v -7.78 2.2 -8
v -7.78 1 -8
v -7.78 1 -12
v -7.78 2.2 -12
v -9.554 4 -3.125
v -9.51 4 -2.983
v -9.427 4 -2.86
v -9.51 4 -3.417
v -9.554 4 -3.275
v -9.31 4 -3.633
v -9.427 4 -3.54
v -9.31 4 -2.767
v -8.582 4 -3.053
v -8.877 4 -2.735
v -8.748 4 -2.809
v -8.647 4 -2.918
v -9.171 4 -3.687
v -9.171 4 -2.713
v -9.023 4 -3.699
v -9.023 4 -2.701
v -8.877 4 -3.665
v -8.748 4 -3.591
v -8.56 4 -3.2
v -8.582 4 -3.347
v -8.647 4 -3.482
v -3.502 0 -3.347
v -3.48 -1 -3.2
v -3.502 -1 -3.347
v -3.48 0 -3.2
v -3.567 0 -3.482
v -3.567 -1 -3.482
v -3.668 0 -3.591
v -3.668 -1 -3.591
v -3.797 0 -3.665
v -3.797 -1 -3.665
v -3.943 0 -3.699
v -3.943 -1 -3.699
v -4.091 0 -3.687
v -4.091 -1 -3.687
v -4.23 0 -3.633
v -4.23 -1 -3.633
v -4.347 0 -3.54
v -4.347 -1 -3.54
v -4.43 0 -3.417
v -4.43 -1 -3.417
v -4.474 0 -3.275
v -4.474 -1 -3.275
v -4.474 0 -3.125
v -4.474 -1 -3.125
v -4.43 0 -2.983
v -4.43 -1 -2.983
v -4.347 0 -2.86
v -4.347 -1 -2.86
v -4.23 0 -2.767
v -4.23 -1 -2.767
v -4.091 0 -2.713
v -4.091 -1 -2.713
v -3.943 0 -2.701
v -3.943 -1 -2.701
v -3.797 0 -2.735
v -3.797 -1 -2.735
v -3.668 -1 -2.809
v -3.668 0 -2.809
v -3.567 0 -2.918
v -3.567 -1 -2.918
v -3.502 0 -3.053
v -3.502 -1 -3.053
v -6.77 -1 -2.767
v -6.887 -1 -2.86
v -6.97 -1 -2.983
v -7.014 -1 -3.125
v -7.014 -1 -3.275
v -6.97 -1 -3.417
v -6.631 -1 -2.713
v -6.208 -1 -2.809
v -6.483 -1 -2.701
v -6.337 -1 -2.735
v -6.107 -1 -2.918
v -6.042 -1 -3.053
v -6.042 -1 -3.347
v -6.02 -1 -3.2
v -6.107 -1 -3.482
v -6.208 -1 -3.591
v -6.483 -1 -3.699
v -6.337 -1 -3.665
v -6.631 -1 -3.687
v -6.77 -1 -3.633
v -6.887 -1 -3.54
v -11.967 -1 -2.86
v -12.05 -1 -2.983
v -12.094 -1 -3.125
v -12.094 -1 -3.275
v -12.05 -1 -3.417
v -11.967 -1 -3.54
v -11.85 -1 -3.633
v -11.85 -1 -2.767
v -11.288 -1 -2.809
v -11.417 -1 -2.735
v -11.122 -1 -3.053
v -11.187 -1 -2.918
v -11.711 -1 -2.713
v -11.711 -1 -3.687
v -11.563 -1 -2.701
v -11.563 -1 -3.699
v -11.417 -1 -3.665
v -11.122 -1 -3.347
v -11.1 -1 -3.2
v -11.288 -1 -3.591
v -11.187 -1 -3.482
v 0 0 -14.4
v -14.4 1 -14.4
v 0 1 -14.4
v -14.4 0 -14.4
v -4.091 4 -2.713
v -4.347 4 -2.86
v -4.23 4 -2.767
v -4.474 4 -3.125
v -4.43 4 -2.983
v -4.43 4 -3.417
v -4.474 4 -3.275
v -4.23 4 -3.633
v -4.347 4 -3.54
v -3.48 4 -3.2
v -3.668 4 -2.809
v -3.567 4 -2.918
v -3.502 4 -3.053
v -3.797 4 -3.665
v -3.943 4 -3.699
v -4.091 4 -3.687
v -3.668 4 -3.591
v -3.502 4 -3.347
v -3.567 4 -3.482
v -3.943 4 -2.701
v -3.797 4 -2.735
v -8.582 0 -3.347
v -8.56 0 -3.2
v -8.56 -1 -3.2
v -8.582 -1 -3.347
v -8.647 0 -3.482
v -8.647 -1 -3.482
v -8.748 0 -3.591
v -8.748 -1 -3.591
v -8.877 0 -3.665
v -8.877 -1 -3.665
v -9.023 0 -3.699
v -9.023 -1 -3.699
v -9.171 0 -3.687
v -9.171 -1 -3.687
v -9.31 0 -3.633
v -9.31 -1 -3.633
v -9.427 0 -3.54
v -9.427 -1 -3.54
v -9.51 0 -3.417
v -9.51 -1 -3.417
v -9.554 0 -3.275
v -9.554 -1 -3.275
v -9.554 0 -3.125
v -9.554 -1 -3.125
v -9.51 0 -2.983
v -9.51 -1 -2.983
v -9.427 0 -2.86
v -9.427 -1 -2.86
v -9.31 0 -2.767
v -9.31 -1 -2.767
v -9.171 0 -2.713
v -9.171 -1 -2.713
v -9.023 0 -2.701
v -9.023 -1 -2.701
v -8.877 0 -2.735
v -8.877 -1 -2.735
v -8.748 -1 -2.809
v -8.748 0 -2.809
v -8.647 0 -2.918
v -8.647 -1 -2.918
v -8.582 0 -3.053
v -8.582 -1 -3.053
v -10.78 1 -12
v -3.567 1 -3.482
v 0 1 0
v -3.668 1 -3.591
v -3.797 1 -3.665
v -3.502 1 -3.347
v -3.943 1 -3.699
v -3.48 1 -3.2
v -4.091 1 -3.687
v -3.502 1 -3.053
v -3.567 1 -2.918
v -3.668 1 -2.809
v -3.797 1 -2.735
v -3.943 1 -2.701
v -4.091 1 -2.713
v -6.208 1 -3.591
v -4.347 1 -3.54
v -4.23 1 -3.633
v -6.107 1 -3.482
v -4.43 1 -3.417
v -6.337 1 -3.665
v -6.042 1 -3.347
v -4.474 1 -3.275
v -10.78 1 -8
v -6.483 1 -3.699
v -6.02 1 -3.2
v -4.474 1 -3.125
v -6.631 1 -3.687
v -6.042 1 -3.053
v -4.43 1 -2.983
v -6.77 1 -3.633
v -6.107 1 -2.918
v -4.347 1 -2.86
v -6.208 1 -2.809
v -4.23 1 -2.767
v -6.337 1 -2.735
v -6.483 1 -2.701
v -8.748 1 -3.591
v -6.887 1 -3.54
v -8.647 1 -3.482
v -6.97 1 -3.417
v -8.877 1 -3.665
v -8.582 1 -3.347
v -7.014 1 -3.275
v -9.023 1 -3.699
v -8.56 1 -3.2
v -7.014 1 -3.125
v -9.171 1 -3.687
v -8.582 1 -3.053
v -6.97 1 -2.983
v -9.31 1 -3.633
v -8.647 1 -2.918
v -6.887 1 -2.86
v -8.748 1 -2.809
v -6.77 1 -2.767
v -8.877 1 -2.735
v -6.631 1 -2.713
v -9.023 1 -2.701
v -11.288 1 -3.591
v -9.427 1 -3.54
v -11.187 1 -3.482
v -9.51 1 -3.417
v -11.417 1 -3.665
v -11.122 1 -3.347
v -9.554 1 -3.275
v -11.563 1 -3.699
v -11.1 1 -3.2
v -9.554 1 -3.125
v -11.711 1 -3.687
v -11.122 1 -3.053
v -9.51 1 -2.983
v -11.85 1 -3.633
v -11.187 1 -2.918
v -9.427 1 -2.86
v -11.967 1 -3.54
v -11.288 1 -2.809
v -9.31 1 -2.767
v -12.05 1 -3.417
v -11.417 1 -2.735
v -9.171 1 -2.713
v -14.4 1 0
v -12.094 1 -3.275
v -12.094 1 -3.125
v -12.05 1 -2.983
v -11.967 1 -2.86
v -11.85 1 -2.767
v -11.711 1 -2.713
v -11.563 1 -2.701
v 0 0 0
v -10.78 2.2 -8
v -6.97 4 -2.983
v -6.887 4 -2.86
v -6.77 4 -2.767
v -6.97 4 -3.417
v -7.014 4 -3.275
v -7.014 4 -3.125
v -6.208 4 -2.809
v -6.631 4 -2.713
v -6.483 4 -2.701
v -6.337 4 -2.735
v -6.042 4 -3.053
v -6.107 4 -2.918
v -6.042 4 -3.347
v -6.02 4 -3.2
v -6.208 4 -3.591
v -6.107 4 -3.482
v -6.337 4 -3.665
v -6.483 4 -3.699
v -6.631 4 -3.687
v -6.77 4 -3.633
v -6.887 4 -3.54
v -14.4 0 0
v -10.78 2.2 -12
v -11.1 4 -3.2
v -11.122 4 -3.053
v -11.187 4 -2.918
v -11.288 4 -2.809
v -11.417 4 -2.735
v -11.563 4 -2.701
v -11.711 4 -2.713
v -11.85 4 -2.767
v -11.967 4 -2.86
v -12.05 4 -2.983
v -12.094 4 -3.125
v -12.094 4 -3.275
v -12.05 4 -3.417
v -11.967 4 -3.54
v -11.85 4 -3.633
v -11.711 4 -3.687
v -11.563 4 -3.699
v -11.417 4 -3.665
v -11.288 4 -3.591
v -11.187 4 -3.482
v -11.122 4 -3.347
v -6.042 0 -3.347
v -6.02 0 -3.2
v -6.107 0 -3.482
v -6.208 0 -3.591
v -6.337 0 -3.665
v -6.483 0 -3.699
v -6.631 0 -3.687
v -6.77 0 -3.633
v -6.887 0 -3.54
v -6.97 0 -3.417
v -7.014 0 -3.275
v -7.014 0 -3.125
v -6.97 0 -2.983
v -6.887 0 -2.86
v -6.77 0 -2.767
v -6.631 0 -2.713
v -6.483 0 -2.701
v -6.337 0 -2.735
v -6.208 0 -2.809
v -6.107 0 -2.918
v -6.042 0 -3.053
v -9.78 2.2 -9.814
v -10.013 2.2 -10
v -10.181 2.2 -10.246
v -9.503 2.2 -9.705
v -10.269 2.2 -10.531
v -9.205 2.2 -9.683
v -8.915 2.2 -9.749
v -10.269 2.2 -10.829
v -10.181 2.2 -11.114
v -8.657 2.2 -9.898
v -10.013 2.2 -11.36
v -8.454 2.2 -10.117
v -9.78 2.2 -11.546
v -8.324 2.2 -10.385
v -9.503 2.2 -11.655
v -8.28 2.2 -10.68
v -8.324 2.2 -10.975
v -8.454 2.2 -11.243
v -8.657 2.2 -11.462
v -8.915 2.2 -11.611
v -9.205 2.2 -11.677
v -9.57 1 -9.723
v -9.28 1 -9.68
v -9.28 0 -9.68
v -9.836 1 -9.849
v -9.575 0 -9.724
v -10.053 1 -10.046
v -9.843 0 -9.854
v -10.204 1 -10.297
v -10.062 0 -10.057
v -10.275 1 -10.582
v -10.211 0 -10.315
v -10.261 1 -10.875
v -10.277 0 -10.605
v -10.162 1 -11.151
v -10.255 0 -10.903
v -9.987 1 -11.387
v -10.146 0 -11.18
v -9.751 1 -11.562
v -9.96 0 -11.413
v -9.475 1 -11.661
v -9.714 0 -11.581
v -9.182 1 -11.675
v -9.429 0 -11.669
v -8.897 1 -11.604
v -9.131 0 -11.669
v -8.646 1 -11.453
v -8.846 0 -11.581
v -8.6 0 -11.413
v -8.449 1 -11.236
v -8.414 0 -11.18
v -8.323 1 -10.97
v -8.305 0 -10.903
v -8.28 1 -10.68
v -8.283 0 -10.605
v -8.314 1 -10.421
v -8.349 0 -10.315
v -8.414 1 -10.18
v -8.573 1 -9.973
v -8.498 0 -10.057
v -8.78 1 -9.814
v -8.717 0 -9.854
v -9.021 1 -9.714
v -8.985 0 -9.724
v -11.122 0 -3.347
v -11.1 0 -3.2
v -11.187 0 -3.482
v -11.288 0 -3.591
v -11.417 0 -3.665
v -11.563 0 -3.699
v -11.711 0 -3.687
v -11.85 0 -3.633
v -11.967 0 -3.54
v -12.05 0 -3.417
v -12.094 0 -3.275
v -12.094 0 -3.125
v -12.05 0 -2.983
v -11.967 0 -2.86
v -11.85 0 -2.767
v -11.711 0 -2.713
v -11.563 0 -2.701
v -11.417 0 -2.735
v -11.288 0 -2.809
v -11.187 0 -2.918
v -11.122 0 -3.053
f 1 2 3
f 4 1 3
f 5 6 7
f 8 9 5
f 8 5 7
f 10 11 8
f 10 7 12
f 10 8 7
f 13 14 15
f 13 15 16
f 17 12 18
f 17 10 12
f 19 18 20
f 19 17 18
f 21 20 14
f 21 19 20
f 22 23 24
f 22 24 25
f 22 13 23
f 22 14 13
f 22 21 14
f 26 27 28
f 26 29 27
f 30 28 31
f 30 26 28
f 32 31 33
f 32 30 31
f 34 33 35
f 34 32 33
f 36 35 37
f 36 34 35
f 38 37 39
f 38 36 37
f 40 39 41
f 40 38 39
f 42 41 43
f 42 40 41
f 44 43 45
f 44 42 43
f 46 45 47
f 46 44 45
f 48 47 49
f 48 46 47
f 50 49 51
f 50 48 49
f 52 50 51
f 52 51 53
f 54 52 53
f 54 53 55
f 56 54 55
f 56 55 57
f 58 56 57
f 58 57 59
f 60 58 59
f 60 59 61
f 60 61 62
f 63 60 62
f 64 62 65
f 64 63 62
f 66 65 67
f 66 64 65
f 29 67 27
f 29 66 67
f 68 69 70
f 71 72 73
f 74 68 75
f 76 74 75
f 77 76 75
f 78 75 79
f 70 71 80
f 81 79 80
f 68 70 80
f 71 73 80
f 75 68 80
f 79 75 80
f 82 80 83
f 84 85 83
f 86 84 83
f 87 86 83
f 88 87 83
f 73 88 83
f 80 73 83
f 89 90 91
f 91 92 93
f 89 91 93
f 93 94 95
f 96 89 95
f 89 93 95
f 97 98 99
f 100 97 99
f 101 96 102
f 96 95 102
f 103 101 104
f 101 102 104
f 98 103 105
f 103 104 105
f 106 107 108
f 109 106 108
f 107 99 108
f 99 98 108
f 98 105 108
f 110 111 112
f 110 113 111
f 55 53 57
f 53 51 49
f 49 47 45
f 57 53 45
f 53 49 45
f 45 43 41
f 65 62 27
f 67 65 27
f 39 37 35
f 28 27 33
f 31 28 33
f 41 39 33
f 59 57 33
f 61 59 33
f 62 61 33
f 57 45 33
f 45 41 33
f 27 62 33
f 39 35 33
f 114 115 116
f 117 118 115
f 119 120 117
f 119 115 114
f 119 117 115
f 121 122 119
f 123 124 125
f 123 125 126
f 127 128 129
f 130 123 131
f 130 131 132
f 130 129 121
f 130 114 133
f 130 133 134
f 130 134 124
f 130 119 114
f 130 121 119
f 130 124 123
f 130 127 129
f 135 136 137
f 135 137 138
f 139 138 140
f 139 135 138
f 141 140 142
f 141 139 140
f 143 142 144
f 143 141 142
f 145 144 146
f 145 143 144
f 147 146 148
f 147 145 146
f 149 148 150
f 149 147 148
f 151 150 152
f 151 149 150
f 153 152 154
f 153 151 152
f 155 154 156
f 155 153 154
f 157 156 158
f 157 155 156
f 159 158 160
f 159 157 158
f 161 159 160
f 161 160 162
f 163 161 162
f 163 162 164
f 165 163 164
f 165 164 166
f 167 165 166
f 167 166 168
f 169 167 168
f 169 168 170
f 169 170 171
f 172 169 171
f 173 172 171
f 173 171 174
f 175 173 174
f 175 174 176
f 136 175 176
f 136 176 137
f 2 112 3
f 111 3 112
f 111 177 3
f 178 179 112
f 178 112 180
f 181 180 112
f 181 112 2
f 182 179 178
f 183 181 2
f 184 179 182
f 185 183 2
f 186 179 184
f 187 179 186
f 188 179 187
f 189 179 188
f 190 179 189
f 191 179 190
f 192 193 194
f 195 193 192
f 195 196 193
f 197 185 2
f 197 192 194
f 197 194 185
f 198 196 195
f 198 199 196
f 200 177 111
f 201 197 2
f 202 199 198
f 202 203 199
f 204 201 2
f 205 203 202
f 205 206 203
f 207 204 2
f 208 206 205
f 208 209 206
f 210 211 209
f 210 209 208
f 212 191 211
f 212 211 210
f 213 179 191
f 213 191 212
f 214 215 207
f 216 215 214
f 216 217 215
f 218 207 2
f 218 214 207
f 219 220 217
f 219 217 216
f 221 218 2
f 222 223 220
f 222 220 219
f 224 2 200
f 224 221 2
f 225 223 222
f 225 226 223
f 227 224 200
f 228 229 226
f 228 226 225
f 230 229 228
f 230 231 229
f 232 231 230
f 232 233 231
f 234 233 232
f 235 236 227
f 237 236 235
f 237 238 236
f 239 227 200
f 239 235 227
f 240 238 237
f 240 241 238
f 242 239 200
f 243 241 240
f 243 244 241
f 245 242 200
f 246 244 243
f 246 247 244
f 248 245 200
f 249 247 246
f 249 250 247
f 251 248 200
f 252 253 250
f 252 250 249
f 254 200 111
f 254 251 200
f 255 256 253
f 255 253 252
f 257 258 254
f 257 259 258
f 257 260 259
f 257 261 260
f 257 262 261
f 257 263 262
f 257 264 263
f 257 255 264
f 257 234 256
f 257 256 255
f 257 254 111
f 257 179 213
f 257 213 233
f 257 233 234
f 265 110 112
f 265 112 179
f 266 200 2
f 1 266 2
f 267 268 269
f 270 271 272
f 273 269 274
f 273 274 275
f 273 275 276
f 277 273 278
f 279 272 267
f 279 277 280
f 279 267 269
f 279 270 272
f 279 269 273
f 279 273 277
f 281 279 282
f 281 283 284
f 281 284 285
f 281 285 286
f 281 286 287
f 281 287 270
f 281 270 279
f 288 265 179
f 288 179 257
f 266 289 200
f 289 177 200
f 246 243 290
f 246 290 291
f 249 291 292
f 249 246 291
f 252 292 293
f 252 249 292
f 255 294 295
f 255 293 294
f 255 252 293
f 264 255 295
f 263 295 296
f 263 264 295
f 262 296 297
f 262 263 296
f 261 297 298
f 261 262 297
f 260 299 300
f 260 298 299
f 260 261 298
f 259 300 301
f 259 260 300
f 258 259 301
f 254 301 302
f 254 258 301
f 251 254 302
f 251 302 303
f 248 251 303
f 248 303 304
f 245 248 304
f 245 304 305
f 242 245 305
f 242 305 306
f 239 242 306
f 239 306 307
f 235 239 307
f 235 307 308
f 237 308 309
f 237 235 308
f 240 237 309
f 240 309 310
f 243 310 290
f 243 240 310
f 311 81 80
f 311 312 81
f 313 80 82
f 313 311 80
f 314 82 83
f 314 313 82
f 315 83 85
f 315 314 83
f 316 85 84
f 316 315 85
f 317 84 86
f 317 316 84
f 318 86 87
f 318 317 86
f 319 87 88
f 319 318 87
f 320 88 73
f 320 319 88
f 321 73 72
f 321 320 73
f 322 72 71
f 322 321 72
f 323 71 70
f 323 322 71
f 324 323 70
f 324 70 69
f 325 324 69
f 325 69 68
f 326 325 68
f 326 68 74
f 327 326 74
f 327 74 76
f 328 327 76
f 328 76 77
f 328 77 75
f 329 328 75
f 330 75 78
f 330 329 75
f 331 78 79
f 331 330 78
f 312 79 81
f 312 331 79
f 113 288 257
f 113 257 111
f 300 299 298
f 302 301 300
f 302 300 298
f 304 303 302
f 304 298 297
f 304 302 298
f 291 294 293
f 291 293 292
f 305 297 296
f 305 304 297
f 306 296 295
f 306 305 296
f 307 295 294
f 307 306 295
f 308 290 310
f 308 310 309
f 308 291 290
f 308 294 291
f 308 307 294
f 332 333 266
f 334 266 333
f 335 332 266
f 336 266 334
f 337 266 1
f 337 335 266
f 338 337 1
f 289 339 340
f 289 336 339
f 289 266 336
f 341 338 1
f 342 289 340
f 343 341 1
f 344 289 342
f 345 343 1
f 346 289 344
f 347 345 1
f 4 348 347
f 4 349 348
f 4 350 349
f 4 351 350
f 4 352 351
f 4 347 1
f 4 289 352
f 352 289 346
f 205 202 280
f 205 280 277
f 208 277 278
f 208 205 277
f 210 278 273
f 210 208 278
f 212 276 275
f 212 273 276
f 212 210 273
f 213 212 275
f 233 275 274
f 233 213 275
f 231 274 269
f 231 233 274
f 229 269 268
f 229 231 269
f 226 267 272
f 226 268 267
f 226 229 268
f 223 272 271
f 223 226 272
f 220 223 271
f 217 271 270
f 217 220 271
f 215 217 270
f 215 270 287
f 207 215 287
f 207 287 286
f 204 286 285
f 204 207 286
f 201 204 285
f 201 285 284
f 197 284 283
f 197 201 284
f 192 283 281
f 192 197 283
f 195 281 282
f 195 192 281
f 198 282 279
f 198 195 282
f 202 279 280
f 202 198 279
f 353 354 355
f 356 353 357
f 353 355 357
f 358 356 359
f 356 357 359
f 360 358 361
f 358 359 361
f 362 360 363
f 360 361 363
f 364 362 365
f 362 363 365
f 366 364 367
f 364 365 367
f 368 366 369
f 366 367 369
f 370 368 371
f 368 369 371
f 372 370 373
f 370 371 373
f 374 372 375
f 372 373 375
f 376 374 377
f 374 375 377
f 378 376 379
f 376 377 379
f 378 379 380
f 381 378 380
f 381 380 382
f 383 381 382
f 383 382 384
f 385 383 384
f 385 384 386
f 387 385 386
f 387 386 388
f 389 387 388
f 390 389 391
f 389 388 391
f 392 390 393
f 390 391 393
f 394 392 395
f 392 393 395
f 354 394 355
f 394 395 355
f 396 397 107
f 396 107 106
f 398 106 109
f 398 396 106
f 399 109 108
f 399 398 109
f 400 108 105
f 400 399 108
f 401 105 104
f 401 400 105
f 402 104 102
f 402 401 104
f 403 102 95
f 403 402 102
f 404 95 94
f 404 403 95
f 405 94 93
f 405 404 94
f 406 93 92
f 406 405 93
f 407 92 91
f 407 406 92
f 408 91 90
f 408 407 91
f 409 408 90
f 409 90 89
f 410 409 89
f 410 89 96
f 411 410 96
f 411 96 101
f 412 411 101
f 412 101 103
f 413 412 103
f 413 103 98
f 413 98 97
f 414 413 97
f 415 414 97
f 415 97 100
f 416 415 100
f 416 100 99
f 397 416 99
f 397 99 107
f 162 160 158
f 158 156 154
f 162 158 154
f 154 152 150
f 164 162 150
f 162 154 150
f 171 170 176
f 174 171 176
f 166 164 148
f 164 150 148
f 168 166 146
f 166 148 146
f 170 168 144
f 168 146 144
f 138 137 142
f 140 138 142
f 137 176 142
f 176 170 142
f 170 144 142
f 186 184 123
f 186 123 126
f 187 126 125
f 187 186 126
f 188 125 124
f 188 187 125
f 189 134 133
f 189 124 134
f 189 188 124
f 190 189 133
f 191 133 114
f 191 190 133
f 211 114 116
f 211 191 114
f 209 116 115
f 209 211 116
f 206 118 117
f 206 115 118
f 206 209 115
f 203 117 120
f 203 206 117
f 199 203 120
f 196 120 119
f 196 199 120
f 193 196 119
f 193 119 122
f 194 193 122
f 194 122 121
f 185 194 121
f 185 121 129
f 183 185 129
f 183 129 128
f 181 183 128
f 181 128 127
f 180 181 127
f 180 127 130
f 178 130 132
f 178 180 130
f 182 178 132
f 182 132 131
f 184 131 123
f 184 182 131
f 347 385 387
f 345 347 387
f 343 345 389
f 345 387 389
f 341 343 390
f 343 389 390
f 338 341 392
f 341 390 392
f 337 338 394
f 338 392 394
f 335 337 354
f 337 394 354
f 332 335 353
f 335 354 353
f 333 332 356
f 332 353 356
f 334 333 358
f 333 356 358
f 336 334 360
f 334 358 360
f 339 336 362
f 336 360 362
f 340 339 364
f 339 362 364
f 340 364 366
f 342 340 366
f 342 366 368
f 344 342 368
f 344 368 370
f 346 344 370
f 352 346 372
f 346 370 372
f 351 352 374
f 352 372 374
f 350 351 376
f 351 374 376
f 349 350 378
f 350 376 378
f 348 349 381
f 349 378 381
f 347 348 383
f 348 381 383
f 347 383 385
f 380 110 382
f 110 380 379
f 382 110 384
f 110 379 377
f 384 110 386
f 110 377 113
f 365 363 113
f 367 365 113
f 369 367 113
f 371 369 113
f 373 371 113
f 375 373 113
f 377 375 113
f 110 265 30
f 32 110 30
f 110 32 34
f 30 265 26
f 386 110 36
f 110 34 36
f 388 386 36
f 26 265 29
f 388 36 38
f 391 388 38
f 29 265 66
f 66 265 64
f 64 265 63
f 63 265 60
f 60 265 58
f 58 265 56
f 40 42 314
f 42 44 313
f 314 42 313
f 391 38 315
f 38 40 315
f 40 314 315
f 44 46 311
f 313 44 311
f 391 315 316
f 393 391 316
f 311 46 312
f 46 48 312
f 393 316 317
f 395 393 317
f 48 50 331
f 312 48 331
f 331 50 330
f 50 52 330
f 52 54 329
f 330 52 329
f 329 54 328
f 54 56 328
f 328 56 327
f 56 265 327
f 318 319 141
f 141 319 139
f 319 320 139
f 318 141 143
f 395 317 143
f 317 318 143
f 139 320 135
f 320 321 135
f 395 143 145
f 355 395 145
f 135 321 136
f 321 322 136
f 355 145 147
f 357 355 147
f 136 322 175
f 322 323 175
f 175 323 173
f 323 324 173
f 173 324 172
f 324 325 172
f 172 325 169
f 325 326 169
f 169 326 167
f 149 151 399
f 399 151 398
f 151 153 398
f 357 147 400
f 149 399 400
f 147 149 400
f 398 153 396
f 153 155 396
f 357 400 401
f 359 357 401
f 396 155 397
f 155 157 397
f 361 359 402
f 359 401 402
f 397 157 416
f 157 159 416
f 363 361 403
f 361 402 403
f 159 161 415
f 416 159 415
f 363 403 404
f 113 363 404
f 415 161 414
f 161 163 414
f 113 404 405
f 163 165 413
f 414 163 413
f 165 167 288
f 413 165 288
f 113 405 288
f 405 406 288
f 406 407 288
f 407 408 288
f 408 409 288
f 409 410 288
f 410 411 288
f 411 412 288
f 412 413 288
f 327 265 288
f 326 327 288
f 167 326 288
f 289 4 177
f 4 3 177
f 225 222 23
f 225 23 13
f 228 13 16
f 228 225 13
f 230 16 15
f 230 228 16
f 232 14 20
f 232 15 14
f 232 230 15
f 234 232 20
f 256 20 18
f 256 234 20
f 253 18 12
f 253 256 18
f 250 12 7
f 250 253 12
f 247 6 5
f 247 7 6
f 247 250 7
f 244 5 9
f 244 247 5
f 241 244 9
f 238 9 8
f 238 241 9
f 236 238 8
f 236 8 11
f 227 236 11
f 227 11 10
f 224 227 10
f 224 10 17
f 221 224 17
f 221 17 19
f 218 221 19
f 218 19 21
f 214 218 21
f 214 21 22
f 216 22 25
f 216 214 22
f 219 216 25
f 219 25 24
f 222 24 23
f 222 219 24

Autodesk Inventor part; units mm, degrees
ref_plane "YZ Plane" through (0, 0, 0) normal (1, 0, 0) x (0, 1, 0)
ref_plane "XZ Plane" through (0, 0, 0) normal (0, 1, 0) x (-1, 0, 0)
ref_plane "XY Plane" through (0, 0, 0) normal (0, 0, 1) x (1, 0, 0)
sketch "Skizze1" plane through (0, 0, 0) normal (0, 1, 0) x (-1, 0, 0)
  line L0 (0, 0) -> (14.4, 0)
  line L1 (14.4, 0) -> (14.4, -14.4)
  line L2 (14.4, -14.4) -> (0, -14.4)
  line L3 (0, -14.4) -> (0, 0)
  dimension "d0" = 14.4
  dimension "d1" = 14.4
extrude "Extrusion1" add sketch "Skizze1" along normal blind 1
sketch "Skizze2" plane through (0, 1, 0) normal (0, 1, 0) x (1, 0, 0)
  line L0 (0, 14.4) -> (-14.4, 14.4) projected
  line L1 (0, 0) -> (0, 14.4) projected
  point P0 (-9.28, 10.68)
  dimension "d4" = 3.72
  dimension "d5" = 9.28
hole "Bohrung1" at (-9.28, 1, -10.68) direction (0, -1, 0) diameter 2 end up to surface
sketch "Skizze3" plane through (0, 1, 0) normal (0, 1, 0) x (1, 0, 0)
  circle A0 centre (-9.28, 10.68) radius 1 projected
  line L0 (-14.4, 0) -> (0, 0) projected
  line L1 (0, 0) -> (0, 14.4) projected
  line L2 (0, 14.4) -> (-14.4, 14.4) projected
  line L3 (-14.4, 14.4) -> (-14.4, 0) projected
  line L4 (-10.78, 8) -> (-7.78, 8)
  line L5 (-7.78, 8) -> (-7.78, 12)
  line L6 (-7.78, 12) -> (-10.78, 12)
  line L7 (-10.78, 12) -> (-10.78, 8)
  dimension "d13" = 4
  dimension "d14" = 3
  dimension "d15" = 1.5
  dimension "d16" = 1.32
extrude "Extrusion2" add sketch "Skizze3" along normal blind 1.2 contours L7 L6 L5 L4
sketch "Skizze4" plane through (0, 1, 0) normal (0, 1, 0) x (1, 0, 0)
  line L0 (-14.4, 14.4) -> (-14.4, 0) construction
  line L1 (-14.4, 3.2) -> (0, 3.2) construction
  line L2 (0, 0) -> (0, 14.4) construction
  line L3 (-14.4, 0) -> (0, 0) projected
  circle A0 centre (-11.6, 3.2) radius 0.5
  circle A1 centre (-9.06, 3.2) radius 0.5
  circle A2 centre (-6.52, 3.2) radius 0.5
  circle A3 centre (-3.98, 3.2) radius 0.5
  dimension "d19" = 3.2
  dimension "d20" = 2.8
  dimension "d21" = 2.54
  dimension "d22" = 2.54
  dimension "d23" = 2.54
  dimension "d24" = 1
  dimension "d25" = 1
  dimension "d26" = 1
  dimension "d27" = 1
extrude "Extrusion3" add sketch "Skizze4" along normal blind 3 and the other way blind 2
properties part number "Mic_breakout" material "ABS-Kunststoff"
